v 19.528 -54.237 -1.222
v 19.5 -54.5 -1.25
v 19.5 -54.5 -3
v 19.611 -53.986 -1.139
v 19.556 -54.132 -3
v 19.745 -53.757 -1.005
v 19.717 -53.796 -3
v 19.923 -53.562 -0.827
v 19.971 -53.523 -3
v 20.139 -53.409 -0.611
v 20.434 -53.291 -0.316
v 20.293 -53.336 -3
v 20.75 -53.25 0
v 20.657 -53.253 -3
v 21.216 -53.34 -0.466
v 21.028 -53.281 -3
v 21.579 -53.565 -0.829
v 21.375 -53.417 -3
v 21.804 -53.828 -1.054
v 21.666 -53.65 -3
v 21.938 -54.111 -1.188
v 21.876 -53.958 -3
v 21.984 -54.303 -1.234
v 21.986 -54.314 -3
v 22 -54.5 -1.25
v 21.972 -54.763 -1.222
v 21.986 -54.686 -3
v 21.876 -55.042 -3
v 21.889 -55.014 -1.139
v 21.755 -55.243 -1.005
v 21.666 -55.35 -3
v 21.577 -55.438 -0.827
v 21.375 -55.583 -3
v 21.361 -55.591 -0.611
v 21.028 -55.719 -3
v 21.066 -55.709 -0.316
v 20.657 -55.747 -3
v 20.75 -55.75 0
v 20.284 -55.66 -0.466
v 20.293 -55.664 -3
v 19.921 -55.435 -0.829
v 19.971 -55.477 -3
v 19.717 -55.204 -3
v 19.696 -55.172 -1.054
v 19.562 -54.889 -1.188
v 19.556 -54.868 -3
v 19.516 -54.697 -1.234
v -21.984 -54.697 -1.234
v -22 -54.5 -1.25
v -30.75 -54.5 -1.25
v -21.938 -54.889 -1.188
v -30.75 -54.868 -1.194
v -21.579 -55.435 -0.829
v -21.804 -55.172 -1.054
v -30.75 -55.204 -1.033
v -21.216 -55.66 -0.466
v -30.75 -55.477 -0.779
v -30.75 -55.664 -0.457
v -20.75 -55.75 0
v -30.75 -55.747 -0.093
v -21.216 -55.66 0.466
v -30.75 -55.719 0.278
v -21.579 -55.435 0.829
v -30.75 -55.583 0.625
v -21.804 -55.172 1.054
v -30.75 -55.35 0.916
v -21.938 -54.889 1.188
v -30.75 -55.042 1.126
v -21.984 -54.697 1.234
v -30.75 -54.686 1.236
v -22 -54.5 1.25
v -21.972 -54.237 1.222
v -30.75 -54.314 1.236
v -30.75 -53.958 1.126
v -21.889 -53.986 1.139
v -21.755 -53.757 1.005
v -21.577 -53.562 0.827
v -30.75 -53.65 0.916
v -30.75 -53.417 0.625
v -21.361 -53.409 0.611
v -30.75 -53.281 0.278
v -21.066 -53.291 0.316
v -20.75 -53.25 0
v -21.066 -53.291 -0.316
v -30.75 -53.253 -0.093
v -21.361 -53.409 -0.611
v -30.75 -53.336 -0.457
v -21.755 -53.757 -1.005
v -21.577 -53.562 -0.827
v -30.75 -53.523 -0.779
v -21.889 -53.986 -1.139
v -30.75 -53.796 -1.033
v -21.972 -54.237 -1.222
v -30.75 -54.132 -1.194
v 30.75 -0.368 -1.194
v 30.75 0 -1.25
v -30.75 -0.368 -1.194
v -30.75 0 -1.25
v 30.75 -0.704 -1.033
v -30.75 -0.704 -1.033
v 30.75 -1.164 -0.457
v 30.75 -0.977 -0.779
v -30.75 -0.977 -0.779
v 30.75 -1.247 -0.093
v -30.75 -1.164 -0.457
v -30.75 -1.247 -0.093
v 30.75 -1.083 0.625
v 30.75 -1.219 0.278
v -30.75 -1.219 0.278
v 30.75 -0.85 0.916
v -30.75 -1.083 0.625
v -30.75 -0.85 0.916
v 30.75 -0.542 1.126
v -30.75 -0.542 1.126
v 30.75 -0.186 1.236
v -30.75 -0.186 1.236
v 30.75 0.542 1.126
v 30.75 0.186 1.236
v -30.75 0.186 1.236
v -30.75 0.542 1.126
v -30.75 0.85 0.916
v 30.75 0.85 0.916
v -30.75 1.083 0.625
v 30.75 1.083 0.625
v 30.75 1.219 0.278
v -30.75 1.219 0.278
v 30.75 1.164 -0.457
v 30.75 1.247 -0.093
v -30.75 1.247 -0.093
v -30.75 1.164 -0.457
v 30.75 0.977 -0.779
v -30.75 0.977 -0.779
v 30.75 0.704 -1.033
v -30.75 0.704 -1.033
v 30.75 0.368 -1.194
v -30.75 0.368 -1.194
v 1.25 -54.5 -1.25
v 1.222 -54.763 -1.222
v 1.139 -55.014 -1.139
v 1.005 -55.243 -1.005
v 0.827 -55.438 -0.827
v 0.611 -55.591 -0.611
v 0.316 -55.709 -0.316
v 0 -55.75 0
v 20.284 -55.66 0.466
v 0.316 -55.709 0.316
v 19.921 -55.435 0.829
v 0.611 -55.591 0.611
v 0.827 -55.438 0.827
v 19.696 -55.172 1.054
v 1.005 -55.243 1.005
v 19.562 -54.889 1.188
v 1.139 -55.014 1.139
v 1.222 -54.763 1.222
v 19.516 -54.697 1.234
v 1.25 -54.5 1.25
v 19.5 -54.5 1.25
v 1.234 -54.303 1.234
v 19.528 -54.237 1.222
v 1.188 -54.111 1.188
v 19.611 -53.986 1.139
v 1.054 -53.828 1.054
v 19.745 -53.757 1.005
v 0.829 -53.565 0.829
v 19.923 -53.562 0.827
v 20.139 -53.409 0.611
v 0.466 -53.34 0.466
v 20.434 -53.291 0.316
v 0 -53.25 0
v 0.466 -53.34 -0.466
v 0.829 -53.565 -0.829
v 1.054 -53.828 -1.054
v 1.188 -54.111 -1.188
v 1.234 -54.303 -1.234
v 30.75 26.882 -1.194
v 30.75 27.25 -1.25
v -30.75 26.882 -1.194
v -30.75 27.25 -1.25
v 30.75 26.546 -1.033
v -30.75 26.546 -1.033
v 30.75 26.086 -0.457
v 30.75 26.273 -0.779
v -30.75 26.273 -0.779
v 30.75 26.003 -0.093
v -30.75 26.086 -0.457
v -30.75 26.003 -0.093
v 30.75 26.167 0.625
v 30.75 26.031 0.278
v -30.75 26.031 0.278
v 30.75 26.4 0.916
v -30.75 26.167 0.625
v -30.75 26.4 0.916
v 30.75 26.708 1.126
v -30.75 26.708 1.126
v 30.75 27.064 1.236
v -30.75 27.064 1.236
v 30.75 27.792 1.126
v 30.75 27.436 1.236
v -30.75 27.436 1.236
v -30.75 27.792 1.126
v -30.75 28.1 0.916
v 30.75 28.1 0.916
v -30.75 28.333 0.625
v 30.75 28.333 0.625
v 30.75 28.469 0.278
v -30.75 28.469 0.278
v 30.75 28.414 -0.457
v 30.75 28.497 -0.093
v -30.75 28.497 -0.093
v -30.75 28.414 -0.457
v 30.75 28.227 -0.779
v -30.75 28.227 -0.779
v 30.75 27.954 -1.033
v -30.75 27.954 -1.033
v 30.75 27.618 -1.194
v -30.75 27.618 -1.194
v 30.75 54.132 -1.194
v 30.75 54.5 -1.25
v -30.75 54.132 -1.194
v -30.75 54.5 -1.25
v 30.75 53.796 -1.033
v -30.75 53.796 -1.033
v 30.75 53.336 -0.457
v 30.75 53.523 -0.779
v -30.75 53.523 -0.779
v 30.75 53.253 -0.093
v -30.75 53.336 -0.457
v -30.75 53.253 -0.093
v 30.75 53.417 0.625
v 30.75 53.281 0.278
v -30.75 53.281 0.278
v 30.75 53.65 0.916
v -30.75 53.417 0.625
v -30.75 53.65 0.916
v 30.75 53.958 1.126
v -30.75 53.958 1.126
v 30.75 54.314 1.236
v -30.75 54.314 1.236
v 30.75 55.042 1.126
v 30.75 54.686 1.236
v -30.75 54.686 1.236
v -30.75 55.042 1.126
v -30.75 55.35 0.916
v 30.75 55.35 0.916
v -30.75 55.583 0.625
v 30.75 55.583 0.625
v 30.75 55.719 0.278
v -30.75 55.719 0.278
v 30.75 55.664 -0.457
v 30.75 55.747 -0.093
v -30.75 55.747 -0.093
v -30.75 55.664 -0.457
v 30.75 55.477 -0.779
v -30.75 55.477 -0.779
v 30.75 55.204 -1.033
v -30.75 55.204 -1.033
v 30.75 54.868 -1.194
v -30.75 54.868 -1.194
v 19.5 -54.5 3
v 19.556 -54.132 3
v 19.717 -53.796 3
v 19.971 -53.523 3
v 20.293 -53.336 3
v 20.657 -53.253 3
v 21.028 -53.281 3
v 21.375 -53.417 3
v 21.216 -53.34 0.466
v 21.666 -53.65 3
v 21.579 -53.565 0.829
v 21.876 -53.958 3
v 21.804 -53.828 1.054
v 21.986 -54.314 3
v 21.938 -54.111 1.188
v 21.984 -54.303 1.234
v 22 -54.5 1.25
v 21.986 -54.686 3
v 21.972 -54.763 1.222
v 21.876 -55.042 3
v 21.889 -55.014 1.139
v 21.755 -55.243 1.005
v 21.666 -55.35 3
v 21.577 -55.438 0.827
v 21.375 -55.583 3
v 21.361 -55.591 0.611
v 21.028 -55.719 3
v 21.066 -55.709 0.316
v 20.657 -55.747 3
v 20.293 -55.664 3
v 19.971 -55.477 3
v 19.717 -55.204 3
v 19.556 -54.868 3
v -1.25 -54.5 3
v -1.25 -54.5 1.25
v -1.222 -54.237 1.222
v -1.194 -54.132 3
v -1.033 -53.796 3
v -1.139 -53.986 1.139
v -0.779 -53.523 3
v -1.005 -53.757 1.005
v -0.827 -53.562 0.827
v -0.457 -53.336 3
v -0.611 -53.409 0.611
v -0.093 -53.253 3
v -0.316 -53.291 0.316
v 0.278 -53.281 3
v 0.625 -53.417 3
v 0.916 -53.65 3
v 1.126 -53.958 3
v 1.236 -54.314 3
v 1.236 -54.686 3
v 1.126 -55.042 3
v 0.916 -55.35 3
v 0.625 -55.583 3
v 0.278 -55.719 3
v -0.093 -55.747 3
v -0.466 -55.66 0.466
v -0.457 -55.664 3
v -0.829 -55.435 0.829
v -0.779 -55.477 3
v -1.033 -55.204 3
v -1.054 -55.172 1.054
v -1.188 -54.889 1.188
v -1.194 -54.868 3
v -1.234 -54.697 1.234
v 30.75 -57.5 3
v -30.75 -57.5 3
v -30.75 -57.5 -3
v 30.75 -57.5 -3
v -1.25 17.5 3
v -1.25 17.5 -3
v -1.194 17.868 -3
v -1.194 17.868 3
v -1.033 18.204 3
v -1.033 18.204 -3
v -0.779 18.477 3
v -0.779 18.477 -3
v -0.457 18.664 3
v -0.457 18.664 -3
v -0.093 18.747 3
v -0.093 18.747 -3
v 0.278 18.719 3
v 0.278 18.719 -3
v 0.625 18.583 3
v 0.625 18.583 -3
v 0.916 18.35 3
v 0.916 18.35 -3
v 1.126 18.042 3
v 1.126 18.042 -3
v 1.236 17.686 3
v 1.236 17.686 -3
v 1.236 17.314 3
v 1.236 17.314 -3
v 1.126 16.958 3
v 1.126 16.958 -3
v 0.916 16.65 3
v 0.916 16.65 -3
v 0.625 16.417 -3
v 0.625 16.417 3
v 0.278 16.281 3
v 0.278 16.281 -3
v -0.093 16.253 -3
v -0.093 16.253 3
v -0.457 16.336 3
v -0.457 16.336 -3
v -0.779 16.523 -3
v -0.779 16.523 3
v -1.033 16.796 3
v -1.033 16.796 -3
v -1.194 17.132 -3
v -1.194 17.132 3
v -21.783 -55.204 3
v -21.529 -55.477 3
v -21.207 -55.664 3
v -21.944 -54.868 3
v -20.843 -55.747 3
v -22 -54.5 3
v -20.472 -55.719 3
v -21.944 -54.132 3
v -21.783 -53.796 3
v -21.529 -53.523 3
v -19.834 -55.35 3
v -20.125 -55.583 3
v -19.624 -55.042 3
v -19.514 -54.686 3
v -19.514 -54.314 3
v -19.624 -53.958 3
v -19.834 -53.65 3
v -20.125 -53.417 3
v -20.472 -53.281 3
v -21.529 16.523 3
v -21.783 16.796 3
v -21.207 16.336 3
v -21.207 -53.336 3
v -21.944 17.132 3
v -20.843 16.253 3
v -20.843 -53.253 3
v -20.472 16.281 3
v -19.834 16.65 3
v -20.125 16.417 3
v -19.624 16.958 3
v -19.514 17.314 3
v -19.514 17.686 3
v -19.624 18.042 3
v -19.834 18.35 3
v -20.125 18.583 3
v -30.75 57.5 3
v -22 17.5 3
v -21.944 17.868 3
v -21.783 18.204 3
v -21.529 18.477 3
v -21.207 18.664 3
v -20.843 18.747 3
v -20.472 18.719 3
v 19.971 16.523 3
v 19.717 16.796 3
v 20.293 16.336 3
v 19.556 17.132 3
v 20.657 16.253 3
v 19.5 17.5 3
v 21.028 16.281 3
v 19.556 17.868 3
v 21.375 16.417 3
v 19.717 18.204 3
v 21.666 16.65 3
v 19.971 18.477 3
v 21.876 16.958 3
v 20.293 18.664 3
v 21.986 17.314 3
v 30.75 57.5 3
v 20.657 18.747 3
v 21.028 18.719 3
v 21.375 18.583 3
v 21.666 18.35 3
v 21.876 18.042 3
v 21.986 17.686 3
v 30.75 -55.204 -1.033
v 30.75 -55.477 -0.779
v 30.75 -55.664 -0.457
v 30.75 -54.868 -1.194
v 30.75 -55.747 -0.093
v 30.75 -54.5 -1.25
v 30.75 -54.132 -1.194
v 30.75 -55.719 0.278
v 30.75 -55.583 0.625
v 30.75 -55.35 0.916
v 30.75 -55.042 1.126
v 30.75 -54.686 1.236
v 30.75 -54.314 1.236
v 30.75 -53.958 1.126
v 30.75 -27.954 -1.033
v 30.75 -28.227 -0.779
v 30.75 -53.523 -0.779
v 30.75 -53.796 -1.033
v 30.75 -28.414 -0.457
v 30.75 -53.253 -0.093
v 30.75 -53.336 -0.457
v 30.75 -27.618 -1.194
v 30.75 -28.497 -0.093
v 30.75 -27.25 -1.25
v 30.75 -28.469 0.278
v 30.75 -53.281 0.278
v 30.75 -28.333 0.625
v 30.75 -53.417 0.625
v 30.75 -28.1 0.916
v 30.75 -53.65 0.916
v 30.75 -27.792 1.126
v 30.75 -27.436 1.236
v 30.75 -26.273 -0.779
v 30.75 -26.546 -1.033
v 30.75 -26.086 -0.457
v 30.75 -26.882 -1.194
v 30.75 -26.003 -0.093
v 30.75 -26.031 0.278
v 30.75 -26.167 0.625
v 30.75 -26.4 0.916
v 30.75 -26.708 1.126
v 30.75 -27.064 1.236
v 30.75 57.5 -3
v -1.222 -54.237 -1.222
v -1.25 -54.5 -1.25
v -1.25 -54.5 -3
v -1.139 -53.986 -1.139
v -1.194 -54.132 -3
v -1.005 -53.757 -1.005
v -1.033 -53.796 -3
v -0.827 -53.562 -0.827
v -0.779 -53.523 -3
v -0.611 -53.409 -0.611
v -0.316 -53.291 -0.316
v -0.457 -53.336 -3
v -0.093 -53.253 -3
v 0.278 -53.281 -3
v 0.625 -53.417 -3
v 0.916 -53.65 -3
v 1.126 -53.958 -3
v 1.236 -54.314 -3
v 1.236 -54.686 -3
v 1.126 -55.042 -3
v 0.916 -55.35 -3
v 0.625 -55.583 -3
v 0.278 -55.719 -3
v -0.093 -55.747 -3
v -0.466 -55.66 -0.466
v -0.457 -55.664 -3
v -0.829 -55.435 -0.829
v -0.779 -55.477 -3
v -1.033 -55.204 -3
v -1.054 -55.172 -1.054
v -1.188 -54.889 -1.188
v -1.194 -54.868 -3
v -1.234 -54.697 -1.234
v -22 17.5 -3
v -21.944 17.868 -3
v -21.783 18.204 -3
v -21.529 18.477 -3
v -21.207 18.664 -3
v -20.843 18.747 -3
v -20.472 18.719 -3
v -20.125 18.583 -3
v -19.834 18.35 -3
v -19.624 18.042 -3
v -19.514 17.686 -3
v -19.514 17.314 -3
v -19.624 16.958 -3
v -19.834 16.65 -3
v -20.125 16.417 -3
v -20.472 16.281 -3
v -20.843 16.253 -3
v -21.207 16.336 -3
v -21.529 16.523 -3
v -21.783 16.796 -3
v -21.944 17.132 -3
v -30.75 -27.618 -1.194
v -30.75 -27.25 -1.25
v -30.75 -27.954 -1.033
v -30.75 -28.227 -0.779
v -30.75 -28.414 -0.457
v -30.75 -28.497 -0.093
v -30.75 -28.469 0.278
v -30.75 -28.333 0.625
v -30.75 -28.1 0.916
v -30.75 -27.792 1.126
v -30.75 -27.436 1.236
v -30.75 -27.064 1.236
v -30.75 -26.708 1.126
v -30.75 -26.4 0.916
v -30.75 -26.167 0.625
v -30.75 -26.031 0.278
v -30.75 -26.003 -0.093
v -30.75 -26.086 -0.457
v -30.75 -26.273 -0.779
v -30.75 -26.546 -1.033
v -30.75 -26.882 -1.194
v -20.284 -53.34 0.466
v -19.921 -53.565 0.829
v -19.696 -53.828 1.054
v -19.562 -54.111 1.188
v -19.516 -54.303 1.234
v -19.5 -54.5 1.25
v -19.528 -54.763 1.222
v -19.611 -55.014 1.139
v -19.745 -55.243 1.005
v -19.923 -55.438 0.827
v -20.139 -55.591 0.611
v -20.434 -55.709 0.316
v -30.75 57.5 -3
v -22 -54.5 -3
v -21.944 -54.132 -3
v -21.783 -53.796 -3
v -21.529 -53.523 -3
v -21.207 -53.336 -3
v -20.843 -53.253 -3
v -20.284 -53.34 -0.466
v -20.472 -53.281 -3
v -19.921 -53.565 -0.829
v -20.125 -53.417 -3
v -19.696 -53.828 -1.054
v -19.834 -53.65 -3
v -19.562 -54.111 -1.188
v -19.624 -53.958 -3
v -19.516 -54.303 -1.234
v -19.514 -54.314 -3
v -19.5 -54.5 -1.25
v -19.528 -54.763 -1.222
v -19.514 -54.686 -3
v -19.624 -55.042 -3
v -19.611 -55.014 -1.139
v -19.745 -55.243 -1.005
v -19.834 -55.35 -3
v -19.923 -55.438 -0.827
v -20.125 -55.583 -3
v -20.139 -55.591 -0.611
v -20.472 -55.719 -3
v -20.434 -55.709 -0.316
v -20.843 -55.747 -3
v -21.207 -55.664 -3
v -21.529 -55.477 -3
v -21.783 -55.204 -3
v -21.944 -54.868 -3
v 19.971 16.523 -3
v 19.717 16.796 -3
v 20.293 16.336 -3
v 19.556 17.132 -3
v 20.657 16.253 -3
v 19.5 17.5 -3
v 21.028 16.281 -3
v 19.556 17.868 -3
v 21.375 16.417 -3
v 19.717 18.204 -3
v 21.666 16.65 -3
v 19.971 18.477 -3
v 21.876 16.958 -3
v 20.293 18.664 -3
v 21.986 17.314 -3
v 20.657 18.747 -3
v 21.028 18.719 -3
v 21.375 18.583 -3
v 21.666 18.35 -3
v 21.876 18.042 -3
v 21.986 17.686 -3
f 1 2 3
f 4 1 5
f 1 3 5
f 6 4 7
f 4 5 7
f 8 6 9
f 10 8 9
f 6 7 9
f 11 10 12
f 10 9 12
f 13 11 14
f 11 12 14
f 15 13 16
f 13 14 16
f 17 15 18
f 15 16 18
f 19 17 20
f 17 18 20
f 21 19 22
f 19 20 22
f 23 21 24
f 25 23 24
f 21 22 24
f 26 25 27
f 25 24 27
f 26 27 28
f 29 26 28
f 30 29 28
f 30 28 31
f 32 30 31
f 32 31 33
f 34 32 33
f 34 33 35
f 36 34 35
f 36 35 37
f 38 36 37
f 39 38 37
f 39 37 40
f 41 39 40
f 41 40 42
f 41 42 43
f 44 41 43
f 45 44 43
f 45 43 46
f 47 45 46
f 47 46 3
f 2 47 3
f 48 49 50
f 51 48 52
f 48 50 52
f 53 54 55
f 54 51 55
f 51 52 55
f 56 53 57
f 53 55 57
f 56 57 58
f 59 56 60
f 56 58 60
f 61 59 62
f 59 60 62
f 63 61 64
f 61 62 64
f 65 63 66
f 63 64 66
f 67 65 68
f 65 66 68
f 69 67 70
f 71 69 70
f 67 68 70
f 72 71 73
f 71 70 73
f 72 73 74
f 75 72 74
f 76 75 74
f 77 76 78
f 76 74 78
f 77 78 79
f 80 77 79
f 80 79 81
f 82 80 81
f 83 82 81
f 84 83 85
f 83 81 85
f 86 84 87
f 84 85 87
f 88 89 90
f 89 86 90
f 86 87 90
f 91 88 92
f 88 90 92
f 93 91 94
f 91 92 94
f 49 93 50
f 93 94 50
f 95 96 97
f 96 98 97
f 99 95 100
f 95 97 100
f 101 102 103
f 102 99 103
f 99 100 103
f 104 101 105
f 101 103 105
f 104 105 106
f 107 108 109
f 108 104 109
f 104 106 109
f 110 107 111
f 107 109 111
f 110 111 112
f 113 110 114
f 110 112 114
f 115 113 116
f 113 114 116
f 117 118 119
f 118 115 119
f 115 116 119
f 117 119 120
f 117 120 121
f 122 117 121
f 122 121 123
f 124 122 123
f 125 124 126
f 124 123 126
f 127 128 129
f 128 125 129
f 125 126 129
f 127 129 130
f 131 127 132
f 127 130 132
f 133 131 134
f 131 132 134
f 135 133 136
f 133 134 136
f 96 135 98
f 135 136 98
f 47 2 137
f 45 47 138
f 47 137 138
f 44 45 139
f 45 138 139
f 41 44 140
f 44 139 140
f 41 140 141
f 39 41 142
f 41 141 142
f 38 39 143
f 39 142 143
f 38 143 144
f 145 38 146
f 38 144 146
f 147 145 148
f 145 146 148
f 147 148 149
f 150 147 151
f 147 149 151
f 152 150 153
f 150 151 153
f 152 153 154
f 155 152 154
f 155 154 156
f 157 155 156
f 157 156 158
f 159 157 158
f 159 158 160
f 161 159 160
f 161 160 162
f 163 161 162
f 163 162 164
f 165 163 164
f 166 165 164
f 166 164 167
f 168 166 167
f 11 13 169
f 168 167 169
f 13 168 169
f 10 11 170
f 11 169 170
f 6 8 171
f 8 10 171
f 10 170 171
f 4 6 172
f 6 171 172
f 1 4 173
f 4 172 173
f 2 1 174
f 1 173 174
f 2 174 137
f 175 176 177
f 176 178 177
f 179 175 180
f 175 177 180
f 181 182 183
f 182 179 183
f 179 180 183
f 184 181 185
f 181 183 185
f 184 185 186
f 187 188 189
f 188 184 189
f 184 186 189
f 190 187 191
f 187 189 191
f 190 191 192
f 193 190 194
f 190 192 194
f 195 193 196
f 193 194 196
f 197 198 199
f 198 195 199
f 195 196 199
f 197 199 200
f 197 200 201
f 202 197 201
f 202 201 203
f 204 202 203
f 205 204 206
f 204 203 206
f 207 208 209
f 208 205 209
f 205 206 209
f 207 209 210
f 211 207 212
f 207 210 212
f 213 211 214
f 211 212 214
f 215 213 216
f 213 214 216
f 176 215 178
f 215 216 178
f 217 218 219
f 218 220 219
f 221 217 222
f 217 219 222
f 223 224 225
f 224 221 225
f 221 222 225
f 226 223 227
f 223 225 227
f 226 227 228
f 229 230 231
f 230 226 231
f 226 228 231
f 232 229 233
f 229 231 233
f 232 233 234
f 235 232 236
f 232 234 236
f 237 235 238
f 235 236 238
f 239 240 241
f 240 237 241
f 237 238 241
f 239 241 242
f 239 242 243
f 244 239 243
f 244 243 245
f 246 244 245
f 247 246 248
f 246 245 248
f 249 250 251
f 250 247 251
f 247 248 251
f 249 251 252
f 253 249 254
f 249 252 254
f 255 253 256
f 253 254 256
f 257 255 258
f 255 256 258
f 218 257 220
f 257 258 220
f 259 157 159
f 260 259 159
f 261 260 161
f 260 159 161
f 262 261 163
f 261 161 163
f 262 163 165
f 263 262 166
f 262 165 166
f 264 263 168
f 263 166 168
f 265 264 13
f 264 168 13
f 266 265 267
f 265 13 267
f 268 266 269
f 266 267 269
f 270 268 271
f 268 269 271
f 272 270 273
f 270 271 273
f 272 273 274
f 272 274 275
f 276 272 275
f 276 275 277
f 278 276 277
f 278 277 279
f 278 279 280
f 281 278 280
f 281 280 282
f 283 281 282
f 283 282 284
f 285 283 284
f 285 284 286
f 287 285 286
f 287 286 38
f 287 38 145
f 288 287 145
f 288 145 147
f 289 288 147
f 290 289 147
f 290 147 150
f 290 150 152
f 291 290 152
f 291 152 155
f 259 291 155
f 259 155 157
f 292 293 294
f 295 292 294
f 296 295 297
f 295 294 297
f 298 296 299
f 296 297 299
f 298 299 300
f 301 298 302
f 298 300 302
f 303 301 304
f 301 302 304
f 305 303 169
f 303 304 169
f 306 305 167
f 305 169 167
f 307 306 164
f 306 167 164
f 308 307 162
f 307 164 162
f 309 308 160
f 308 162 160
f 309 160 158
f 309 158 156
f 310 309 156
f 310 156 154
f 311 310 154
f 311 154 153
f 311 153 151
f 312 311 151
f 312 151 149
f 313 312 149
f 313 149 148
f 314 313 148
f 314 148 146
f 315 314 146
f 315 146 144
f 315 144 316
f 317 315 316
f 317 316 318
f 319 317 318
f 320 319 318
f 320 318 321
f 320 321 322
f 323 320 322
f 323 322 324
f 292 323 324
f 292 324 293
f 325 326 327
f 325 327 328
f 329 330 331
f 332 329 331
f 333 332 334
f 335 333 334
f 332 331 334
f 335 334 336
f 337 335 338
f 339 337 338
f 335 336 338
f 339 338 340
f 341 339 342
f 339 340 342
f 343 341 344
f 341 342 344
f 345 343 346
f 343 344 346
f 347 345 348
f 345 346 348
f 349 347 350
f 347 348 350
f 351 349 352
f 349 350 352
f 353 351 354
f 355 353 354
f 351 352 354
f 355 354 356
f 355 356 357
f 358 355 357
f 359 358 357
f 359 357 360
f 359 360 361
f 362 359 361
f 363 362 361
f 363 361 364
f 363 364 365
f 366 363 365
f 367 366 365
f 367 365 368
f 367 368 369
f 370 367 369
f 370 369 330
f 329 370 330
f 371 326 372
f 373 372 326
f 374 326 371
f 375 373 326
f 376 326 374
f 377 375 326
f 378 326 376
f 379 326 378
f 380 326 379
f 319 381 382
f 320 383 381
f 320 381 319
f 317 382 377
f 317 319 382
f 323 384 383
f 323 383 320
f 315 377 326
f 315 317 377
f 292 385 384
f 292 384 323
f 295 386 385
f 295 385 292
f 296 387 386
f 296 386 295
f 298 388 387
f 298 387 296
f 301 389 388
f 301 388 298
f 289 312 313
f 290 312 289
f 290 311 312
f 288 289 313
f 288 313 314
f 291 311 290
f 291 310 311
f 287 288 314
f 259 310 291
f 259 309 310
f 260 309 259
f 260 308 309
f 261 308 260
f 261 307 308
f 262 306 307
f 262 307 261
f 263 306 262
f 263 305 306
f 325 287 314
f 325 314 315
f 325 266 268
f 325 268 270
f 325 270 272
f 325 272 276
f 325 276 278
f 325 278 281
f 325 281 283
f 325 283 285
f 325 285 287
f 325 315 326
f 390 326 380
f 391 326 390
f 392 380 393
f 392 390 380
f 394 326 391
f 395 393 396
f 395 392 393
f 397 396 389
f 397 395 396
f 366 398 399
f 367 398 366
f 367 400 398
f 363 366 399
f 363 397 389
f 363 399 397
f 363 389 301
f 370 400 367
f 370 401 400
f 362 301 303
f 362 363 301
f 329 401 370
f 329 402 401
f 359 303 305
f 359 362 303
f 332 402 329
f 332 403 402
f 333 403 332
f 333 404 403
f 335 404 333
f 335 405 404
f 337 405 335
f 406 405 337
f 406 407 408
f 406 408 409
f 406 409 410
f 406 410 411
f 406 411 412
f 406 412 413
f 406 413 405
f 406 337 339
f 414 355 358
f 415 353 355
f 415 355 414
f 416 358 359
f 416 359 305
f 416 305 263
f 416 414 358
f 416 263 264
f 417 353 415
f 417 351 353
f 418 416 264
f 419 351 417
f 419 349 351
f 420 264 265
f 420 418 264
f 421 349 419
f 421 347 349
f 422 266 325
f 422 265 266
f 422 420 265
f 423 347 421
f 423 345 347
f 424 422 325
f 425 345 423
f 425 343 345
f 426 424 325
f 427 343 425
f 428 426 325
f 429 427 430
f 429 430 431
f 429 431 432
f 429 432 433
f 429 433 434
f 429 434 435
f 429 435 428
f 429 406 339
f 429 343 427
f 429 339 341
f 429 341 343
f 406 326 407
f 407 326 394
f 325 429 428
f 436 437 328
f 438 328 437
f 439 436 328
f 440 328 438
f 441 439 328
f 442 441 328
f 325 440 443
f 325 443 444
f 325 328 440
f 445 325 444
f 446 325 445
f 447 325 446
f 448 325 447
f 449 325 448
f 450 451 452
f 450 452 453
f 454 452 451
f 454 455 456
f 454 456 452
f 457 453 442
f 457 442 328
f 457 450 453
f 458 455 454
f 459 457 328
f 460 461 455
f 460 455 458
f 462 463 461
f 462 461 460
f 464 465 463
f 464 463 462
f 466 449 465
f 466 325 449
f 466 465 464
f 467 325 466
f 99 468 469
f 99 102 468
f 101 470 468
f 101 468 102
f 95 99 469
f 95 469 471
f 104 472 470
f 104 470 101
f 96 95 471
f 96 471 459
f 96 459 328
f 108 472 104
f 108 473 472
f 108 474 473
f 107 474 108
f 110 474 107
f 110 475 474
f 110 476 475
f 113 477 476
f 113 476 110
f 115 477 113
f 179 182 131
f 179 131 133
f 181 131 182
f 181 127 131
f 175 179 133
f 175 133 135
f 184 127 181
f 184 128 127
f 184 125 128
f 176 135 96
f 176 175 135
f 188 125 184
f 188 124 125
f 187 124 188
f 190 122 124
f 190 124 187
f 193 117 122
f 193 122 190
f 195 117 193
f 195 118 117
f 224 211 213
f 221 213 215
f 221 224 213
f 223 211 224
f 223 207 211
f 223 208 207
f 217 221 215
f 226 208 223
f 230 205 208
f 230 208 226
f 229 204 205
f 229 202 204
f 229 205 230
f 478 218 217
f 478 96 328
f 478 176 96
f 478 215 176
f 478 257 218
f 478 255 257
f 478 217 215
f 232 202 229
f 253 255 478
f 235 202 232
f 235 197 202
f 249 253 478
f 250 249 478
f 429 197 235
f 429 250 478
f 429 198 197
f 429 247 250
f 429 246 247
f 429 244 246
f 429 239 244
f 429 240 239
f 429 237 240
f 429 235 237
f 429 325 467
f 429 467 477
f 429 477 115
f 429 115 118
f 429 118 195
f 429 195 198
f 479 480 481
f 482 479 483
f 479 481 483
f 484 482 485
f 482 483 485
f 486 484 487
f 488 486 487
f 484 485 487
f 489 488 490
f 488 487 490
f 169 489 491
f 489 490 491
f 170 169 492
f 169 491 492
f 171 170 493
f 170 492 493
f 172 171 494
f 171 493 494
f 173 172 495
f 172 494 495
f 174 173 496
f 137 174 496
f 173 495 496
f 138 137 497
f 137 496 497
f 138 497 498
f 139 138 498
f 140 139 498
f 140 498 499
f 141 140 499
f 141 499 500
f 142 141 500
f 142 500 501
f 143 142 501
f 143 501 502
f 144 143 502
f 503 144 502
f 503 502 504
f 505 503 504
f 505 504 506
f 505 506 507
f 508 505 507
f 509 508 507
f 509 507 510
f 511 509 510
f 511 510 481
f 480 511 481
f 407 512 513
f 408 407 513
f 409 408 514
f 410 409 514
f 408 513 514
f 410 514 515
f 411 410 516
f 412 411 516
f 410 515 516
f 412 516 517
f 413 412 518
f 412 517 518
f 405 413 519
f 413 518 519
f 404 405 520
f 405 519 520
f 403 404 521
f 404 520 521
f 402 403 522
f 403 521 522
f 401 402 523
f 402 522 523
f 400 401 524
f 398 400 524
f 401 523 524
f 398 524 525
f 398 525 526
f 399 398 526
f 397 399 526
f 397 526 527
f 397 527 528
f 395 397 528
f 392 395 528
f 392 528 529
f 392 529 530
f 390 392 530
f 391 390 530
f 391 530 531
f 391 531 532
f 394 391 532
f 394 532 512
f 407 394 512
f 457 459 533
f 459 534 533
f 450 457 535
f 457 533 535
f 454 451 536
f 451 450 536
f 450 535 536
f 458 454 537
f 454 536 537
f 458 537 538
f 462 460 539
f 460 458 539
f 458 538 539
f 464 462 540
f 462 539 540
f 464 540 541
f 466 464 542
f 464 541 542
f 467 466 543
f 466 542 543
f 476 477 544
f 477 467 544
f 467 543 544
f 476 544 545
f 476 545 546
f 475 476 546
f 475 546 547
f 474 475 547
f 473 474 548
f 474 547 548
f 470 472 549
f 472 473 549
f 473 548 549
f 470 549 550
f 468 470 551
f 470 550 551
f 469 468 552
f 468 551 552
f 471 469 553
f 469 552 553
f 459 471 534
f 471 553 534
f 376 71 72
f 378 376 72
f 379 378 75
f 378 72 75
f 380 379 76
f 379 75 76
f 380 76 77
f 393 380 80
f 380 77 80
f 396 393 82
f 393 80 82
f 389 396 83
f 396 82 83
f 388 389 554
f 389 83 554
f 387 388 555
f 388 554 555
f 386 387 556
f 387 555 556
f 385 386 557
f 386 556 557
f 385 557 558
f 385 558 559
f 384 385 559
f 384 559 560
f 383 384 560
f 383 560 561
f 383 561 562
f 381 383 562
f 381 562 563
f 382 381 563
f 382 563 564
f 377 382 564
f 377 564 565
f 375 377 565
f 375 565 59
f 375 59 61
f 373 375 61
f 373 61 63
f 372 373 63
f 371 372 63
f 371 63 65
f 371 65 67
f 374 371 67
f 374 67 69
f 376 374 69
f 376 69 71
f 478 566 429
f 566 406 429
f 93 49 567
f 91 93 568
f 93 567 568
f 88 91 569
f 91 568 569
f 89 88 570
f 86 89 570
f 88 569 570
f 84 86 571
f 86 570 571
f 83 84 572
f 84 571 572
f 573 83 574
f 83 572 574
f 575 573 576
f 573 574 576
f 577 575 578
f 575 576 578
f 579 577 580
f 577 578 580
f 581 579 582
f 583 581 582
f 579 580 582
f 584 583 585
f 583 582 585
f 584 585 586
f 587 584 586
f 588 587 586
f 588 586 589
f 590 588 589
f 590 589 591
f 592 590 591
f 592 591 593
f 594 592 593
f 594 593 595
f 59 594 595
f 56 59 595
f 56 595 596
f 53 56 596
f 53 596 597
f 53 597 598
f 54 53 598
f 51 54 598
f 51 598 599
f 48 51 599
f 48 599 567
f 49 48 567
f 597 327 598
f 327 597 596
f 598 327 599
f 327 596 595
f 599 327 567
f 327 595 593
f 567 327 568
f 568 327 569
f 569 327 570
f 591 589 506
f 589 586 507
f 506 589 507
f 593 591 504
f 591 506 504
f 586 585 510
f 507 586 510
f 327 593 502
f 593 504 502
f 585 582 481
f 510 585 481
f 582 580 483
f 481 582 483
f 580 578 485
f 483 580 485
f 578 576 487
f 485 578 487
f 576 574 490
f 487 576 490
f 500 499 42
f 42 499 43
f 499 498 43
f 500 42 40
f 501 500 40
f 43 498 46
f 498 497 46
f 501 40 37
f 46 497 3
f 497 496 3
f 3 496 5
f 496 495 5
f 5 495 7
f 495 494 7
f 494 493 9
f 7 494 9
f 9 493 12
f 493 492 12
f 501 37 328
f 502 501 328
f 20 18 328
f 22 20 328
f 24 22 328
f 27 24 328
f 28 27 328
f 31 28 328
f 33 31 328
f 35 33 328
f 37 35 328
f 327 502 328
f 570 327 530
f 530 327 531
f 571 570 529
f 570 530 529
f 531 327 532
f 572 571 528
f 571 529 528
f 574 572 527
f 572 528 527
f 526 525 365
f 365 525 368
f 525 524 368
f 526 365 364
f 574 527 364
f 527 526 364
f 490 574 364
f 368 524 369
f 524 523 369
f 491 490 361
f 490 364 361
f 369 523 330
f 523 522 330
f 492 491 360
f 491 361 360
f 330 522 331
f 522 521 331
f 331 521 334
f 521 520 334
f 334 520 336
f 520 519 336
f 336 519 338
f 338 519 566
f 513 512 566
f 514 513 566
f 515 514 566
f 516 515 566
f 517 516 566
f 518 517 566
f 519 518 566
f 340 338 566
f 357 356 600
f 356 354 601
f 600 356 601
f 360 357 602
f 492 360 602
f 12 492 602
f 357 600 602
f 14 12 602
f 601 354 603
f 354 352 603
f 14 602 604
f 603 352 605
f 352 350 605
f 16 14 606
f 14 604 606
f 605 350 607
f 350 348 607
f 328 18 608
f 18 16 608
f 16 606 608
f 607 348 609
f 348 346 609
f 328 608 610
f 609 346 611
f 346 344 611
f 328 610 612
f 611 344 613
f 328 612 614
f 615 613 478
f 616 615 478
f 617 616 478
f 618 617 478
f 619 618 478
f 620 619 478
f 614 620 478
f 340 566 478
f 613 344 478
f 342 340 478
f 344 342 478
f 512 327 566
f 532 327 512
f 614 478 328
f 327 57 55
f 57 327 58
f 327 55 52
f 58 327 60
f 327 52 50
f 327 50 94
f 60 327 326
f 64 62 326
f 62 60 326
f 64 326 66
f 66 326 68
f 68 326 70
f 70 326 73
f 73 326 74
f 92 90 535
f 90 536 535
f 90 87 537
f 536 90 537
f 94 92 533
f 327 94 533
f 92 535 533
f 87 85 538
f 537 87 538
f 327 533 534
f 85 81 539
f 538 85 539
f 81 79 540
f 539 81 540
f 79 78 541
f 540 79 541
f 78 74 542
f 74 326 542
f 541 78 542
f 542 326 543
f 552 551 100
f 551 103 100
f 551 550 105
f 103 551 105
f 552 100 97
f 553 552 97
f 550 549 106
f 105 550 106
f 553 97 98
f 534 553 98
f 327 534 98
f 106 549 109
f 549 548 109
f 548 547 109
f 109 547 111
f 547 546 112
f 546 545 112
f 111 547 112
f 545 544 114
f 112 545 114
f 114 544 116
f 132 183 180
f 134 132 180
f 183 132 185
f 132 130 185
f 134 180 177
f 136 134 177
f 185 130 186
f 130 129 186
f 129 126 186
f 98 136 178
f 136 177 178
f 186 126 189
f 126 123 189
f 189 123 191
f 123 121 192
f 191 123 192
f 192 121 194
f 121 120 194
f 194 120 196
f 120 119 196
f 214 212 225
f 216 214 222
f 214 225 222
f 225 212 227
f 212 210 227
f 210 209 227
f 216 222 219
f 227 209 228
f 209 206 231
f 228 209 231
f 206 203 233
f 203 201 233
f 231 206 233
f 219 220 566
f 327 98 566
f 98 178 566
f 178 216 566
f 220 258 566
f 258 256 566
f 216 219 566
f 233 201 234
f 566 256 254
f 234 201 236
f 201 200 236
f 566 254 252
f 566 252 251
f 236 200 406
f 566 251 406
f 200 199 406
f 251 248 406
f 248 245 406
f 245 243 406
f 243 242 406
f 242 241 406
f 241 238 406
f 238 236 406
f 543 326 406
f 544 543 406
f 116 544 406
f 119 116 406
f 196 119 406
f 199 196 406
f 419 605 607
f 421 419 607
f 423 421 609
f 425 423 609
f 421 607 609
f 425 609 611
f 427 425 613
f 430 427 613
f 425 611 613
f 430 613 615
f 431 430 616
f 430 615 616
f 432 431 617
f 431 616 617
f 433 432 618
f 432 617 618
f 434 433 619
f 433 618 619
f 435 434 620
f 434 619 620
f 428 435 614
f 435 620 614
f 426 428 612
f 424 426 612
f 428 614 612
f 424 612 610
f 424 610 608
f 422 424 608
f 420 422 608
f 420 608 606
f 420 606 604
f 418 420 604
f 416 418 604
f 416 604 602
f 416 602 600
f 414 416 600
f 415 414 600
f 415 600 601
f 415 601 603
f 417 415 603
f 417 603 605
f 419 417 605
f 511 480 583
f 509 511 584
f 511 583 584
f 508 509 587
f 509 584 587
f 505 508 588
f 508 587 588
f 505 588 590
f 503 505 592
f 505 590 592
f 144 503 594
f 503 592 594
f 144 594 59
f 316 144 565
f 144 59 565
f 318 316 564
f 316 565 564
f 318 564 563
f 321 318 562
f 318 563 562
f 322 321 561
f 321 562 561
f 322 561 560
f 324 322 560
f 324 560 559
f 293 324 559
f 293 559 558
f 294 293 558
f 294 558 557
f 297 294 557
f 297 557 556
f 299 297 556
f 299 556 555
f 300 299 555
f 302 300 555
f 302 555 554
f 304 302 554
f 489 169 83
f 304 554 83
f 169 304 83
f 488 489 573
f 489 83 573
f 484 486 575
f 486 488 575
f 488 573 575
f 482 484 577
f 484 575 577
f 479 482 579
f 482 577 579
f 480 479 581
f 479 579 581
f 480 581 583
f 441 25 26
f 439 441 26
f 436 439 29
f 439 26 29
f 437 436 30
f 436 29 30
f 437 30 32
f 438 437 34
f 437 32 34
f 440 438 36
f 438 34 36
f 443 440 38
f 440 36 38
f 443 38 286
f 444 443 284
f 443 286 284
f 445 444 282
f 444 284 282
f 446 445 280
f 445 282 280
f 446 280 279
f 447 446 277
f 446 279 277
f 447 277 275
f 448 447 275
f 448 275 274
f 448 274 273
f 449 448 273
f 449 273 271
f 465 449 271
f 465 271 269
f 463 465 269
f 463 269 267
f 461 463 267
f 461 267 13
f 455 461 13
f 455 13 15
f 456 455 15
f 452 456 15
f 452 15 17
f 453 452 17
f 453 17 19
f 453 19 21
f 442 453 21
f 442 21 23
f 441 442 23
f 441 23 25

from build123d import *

# Parameters (mm, degrees)
SKETCH_1_W           = 61.5
SKETCH_1_H           = 115
EXTRUDE_1_DEPTH      = 3
M3X0_5_1_D           = 2.5
M3X0_5_1_ON_FACE_2_D = 2.5
M3X0_5_1_ON_FACE_3_D = 2.5


with BuildPart() as part:
    # ｽｹｯﾁ1 → ﾎﾞｽ - 押し出し1 (new, symmetric)
    with BuildSketch(Plane.XY):
        Rectangle(SKETCH_1_W, SKETCH_1_H)
    extrude(amount=EXTRUDE_1_DEPTH, both=True)

    # M3x0.5 ねじ穴1 (through all)
    with Locations(Plane(origin=(-20.75, 17.5, 3), x_dir=(1, 0, 0), z_dir=(0, 0, 1))):
        with Locations((0, 0), (20.75, 0), (41.5, 0), (41.5, -72), (20.75, -72), (0, -72)):
            Hole(M3X0_5_1_D / 2)

    # M3x0.5 ねじ穴1 on face 2 (through all)
    with Locations(Plane(origin=(30.75, 54.5, 0), x_dir=(0, 0, 1), z_dir=(1, 0, 0))):
        with Locations((0, 0), (0, 27.25), (0, 54.5), (0, 81.75), (0, 109)):
            Hole(M3X0_5_1_ON_FACE_2_D / 2)

    # M3x0.5 ねじ穴1 on face 3 (through all)
    with Locations(Plane(origin=(-30.75, -54.5, 0), x_dir=(0, 0, -1), z_dir=(-1, 0, 0))):
        with Locations((0, 0), (0, -27.25), (0, -54.5), (0, -81.75), (0, -109)):
            Hole(M3X0_5_1_ON_FACE_3_D / 2)


solid = part.part
